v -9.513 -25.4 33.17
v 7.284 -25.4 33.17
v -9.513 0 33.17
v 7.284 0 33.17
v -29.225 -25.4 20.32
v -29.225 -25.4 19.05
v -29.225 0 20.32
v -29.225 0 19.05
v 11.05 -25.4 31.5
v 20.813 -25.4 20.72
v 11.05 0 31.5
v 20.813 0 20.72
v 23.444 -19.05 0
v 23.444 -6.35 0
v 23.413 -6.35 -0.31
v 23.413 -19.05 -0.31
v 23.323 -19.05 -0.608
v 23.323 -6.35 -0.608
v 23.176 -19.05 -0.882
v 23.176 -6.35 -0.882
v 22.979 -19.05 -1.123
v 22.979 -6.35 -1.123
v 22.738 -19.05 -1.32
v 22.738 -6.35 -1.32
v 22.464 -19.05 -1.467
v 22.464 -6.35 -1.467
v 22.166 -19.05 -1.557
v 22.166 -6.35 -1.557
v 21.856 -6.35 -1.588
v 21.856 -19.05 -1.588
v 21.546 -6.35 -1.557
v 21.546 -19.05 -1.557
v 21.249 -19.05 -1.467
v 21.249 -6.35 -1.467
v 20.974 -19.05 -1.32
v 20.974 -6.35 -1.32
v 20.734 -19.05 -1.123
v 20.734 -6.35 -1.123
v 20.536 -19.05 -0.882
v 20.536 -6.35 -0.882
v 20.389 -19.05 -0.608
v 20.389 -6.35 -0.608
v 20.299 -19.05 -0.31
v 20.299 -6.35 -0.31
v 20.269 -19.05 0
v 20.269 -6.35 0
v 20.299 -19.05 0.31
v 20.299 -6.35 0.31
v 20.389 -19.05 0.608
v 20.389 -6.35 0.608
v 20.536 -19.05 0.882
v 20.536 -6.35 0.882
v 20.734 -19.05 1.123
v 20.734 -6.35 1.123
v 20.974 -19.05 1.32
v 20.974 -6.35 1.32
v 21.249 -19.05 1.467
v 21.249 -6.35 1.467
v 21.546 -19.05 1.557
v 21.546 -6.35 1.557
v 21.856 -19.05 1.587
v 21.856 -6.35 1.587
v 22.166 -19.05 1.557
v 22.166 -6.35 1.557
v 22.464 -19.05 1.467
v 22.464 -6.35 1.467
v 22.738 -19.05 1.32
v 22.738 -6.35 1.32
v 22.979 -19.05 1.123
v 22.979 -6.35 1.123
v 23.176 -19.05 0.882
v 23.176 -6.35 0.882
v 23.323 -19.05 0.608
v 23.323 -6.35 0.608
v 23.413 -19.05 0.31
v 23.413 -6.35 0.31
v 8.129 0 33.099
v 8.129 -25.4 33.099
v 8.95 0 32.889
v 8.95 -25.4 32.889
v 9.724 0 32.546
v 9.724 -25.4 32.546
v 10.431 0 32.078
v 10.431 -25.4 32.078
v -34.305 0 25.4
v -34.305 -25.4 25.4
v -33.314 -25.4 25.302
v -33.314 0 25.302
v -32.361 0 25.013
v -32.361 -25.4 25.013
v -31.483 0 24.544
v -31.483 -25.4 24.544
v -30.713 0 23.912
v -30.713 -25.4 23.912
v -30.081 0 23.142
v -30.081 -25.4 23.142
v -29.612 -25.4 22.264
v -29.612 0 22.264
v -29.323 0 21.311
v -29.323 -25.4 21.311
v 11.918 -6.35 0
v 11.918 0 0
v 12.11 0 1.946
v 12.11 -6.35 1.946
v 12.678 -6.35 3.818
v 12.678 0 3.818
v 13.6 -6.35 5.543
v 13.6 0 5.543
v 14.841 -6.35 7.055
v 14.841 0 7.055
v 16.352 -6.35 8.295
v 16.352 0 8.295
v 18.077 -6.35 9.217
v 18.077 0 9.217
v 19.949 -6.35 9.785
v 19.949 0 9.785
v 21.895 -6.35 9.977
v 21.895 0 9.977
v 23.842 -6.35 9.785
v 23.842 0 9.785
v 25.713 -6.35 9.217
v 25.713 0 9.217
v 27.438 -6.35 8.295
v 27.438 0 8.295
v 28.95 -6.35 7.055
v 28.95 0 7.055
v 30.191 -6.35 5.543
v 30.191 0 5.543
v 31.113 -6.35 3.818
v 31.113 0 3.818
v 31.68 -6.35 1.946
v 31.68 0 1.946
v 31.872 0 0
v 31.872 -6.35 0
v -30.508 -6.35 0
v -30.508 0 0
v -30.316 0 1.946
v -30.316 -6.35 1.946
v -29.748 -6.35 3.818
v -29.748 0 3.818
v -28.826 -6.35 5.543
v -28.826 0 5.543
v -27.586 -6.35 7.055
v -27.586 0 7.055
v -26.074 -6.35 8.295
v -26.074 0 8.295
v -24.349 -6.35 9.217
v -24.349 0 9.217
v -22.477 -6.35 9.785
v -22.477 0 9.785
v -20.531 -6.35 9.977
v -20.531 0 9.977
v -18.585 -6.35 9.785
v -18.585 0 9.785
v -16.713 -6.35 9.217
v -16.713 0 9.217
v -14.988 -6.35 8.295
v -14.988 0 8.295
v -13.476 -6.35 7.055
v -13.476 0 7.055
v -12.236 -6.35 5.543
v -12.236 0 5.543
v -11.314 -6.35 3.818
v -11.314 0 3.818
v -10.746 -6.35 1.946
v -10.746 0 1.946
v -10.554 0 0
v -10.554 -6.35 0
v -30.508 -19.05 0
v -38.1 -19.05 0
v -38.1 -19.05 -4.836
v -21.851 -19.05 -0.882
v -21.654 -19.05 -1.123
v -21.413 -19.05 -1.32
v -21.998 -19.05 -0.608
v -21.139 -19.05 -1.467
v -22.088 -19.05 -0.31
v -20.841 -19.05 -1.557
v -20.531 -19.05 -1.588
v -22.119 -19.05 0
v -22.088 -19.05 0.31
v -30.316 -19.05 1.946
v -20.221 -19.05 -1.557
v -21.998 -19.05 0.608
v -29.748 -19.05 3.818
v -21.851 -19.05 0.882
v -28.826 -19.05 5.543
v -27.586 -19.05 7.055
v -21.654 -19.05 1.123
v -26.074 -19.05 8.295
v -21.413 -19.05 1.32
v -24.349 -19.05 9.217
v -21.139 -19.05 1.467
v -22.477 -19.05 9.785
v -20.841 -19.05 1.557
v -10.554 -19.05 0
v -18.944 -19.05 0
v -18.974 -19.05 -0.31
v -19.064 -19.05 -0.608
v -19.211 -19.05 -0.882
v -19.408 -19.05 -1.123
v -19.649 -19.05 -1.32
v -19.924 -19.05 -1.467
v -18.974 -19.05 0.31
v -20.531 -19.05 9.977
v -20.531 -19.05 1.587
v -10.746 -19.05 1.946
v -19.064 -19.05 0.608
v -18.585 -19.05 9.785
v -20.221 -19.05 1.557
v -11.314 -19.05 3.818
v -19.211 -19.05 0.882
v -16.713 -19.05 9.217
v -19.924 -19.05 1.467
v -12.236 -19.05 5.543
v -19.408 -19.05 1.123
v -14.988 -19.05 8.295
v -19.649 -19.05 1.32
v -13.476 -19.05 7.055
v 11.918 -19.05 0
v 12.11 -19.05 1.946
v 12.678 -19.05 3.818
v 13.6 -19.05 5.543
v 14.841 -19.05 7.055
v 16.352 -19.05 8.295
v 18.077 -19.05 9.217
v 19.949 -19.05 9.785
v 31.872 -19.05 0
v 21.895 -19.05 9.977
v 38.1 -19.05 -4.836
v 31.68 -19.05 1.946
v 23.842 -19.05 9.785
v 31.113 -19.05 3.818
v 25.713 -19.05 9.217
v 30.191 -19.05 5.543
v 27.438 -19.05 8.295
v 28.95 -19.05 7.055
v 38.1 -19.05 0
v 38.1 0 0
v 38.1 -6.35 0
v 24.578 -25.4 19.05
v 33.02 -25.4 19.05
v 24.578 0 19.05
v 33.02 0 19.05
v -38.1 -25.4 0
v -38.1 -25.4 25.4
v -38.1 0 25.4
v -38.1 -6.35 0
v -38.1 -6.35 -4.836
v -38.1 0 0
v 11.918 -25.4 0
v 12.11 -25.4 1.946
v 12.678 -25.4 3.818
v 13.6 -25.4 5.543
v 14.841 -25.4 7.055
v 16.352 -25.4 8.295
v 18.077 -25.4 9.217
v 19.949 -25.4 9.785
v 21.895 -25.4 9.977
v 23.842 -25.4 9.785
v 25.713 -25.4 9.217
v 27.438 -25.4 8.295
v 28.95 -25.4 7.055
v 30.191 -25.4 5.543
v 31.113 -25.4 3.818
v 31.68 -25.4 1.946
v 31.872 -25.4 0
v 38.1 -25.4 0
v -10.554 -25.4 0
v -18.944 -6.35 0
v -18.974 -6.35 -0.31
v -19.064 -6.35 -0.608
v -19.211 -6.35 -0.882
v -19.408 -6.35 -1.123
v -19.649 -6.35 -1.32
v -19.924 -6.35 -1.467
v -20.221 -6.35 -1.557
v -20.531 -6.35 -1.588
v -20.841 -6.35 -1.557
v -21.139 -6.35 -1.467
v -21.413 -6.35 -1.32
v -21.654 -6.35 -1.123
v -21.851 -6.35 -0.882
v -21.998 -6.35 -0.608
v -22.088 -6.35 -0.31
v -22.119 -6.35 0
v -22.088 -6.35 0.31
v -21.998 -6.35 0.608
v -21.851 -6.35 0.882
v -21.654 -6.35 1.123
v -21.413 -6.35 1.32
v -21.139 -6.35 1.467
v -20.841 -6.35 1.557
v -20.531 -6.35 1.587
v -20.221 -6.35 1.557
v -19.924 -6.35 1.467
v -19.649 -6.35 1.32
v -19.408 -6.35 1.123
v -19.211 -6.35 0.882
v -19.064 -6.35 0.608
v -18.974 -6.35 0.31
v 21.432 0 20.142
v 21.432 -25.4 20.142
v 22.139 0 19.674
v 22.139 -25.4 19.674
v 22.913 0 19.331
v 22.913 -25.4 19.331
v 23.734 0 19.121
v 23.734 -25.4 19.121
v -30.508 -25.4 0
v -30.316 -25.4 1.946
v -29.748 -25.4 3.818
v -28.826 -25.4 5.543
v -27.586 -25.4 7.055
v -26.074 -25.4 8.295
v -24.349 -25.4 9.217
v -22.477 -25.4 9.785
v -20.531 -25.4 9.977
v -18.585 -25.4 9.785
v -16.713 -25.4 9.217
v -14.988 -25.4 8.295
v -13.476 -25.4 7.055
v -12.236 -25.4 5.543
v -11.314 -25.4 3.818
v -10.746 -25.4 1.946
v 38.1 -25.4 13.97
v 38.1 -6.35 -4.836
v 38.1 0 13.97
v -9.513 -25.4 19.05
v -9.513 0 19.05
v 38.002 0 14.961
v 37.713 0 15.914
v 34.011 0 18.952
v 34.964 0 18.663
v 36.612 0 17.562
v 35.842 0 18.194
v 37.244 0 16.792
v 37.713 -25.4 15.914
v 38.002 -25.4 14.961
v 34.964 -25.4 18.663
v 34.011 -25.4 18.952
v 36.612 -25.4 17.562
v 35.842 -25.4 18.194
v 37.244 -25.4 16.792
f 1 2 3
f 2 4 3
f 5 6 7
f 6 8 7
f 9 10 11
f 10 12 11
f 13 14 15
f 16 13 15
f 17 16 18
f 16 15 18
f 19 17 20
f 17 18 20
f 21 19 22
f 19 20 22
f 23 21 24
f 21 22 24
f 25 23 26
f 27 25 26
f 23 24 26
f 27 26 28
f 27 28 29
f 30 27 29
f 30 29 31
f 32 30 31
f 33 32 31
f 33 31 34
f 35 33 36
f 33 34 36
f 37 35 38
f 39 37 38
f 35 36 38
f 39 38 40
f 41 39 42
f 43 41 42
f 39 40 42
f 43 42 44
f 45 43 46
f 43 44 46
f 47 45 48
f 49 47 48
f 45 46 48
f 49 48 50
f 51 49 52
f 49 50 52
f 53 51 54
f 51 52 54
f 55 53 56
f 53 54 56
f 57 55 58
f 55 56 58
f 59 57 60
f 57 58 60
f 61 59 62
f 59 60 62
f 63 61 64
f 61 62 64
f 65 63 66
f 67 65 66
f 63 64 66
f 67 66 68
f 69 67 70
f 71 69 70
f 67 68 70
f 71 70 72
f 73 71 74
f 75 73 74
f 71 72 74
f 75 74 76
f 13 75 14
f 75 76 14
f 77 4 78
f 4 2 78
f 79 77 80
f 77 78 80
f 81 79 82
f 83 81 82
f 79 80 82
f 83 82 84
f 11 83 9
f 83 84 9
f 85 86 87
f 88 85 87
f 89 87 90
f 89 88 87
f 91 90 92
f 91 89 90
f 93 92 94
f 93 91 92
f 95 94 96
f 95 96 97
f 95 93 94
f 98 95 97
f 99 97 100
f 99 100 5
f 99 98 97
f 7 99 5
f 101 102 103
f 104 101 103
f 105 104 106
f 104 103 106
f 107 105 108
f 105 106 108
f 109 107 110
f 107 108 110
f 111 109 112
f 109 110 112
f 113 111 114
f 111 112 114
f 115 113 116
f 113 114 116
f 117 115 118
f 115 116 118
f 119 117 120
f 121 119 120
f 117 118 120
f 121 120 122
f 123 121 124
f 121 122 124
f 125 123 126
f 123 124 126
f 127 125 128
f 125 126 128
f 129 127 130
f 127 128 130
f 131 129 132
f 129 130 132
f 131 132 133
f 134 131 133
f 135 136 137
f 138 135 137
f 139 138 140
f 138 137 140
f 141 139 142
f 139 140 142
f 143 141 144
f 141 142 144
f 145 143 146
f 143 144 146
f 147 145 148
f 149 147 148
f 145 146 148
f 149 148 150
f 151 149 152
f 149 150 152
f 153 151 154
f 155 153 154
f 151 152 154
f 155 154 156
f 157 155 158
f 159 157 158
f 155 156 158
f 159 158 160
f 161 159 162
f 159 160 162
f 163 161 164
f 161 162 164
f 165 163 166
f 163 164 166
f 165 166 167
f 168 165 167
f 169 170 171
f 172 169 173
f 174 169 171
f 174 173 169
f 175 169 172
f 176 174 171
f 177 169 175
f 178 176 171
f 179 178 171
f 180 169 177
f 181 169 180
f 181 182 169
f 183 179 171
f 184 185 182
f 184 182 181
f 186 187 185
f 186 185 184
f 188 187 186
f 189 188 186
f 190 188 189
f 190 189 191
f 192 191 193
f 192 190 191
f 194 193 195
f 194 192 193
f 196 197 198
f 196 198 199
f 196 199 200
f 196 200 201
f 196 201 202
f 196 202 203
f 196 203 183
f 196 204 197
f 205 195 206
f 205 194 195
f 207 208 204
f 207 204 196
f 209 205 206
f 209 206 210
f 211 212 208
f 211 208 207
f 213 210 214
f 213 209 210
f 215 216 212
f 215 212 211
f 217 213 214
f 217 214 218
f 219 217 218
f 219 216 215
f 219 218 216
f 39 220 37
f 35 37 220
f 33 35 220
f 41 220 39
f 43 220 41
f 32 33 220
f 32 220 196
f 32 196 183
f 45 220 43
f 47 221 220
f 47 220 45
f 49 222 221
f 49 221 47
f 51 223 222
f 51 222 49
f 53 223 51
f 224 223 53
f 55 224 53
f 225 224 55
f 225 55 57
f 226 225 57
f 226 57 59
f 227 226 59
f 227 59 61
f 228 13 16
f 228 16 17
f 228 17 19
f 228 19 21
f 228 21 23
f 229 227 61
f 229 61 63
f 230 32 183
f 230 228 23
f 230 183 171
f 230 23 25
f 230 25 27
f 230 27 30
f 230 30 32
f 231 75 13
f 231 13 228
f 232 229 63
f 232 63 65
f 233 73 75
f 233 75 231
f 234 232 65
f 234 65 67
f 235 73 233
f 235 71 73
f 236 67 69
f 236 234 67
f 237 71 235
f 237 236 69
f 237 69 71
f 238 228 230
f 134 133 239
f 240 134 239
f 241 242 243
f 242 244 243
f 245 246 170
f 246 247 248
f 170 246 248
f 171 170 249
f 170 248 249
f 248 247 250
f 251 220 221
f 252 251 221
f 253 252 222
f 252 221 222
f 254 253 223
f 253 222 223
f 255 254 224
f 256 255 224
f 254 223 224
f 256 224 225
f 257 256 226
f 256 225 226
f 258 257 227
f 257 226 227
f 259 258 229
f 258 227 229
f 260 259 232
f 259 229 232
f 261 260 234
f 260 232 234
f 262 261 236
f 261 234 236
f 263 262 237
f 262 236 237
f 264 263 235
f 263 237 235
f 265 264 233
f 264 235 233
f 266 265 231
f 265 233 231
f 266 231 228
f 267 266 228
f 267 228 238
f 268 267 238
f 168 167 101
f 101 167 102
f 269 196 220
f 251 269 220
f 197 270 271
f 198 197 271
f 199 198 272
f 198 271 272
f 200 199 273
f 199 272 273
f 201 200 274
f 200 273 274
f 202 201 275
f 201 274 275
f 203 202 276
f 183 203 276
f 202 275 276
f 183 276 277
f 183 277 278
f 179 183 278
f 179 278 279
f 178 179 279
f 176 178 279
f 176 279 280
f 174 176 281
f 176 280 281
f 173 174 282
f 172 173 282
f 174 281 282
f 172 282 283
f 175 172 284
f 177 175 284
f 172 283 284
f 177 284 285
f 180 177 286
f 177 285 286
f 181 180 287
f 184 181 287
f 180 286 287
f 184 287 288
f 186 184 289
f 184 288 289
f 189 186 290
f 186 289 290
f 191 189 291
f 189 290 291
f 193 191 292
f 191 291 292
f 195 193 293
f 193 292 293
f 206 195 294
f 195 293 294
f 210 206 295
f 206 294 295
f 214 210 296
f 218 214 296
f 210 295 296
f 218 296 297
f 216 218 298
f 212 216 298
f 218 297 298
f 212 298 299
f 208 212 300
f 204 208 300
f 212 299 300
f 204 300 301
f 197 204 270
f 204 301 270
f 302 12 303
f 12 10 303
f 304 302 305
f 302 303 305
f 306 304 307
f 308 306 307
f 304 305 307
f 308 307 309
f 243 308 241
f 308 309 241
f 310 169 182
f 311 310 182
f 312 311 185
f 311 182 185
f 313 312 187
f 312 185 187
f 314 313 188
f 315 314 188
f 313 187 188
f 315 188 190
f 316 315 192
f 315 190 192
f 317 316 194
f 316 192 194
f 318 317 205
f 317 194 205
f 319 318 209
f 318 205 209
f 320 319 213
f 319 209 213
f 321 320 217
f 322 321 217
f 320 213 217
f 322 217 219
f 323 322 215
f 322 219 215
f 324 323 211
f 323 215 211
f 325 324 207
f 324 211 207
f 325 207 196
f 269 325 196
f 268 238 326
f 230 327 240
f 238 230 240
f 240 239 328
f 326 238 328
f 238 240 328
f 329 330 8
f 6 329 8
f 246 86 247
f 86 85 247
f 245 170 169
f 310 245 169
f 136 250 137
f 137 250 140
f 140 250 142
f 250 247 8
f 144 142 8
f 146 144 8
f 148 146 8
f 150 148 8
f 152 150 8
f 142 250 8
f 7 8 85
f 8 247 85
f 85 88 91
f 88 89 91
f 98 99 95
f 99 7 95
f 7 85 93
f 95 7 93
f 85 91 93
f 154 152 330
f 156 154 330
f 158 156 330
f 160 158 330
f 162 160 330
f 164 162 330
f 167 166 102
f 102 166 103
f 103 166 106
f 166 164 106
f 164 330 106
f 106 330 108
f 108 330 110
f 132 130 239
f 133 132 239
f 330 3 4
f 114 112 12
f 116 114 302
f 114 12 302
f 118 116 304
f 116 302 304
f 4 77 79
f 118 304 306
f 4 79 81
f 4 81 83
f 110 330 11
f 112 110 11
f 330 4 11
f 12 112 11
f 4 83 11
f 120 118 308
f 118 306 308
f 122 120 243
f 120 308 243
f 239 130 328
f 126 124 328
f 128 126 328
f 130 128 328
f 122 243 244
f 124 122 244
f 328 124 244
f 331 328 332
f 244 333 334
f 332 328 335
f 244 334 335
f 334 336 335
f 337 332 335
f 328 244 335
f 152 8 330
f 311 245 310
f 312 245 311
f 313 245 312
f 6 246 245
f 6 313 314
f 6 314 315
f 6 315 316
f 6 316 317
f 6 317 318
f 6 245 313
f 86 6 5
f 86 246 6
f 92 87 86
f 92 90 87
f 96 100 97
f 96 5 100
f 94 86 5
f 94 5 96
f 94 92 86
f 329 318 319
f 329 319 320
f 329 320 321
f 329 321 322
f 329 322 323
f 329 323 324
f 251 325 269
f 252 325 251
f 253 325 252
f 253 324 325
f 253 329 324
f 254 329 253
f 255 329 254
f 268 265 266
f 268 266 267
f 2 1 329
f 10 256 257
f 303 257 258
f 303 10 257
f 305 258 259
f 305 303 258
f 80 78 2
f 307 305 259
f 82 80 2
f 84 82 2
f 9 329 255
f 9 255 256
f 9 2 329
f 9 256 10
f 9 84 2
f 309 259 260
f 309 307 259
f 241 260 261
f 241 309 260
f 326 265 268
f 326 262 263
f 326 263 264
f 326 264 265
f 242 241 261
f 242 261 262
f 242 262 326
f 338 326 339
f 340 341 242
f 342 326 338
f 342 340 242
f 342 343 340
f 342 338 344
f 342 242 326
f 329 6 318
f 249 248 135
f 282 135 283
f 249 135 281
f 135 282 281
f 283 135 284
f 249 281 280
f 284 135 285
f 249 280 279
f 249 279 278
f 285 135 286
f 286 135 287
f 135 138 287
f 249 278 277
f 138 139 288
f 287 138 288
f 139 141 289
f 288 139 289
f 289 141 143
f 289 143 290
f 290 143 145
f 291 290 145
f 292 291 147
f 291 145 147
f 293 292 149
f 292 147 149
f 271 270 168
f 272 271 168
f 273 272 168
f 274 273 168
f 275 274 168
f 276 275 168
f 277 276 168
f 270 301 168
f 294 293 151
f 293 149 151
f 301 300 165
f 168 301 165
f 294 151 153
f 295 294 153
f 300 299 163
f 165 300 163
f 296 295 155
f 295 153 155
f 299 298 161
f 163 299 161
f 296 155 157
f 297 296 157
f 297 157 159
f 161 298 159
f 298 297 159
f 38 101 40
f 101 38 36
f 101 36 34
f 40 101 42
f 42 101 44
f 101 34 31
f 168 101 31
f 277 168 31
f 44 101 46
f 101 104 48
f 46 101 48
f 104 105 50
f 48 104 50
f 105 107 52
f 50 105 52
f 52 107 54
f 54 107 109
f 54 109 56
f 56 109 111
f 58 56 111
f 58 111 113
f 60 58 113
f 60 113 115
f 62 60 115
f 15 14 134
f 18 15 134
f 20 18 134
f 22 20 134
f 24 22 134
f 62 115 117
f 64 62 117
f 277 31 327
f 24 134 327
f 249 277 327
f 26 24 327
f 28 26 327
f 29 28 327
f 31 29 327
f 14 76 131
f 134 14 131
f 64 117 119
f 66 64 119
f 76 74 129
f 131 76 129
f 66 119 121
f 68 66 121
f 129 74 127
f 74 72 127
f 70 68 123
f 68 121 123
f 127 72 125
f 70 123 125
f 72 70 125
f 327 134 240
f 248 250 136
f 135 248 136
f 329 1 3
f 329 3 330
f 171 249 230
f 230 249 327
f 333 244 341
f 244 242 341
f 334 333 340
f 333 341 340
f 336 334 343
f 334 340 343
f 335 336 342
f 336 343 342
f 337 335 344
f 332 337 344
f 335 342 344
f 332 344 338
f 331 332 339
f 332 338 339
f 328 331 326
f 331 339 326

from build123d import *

# Parameters (mm, degrees)
F1_DEPTH = 6.35
F3_DEPTH = 12.7
F5_DEPTH = 6.35
F6_R     = 5.08
F7_R     = 5.08
F8_R     = 5.08


with BuildPart() as f1:
    # F0 (on Front) → F1 (new body)
    with BuildSketch(Plane.XZ):
        with BuildLine():
            Line((-29.225341, 25.4), (-38.1, 25.4))
            Line((-38.1, 25.4), (-38.1, 0))
            Line((-38.1, 0), (-30.507866, 0))
            ThreePointArc((-30.507866, 0), (-20.531018, 9.976848), (-10.554171, 0))
            Line((-10.554171, 0), (11.91838, 0))
            ThreePointArc((11.91838, 0), (21.895228, 9.976848), (31.872075, 0))
            Line((31.872075, 0), (38.1, 0))
            Line((38.1, 0), (38.1, 19.05))
            Line((38.1, 19.05), (22.325266, 19.05))
            Line((22.325266, 19.05), (9.537391, 33.169942))
            Line((9.537391, 33.169942), (-9.512609, 33.169942))
            Line((-9.512609, 33.169942), (-9.512609, 19.05))
            Line((-9.512609, 19.05), (-29.225341, 19.05))
            Line((-29.225341, 19.05), (-29.225341, 25.4))
        make_face()
    extrude(amount=F1_DEPTH)

    # F2 (on face) → F3 (join)
    with BuildSketch(Plane.XZ.offset(6.35)):
        with BuildLine():
            Line((-29.225341, 25.4), (-38.1, 25.4))
            Line((-38.1, 25.4), (-38.1, 0))
            Line((-38.1, 0), (-22.118518, 0))
            ThreePointArc((-22.118518, 0), (-20.531018, 1.5875), (-18.943518, 0))
            Line((-18.943518, 0), (20.268538, 0))
            ThreePointArc((20.268538, 0), (21.856038, 1.5875), (23.443538, 0))
            Line((23.443538, 0), (38.1, 0))
            Line((38.1, 0), (38.1, 19.05))
            Line((38.1, 19.05), (22.325266, 19.05))
            Line((22.325266, 19.05), (9.537391, 33.169942))
            Line((9.537391, 33.169942), (-9.512609, 33.169942))
            Line((-9.512609, 33.169942), (-9.512609, 19.05))
            Line((-9.512609, 19.05), (-29.225341, 19.05))
            Line((-29.225341, 19.05), (-29.225341, 25.4))
        make_face()
        with BuildLine():
            Line((-22.118518, 0), (-38.1, 0))
            Line((-38.1, 0), (-38.1, -4.83568))
            Line((-38.1, -4.83568), (38.1, -4.83568))
            Line((38.1, -4.83568), (38.1, 0))
            Line((38.1, 0), (23.443538, 0))
            ThreePointArc((23.443538, 0), (21.856038, -1.5875), (20.268538, 0))
            Line((20.268538, 0), (-18.943518, 0))
            ThreePointArc((-18.943518, 0), (-20.531018, -1.5875), (-22.118518, 0))
        make_face()
    extrude(amount=F3_DEPTH)

    # F4 (on face) → F5 (join)
    with BuildSketch(Plane.XZ.offset(19.05)):
        with BuildLine():
            Line((-29.225341, 25.4), (-38.1, 25.4))
            Line((-38.1, 25.4), (-38.1, 0))
            Line((-38.1, 0), (-30.507866, 0))
            ThreePointArc((-30.507866, 0), (-20.531018, 9.976848), (-10.554171, 0))
            Line((-10.554171, 0), (11.91838, 0))
            ThreePointArc((11.91838, 0), (21.895228, 9.976848), (31.872075, 0))
            Line((31.872075, 0), (38.1, 0))
            Line((38.1, 0), (38.1, 19.05))
            Line((38.1, 19.05), (22.325266, 19.05))
            Line((22.325266, 19.05), (9.537391, 33.169942))
            Line((9.537391, 33.169942), (-9.512609, 33.169942))
            Line((-9.512609, 33.169942), (-9.512609, 19.05))
            Line((-9.512609, 19.05), (-29.225341, 19.05))
            Line((-29.225341, 19.05), (-29.225341, 25.4))
        make_face()
    extrude(amount=F5_DEPTH)

    # F6
    f6_edges = [f1.edges().sort_by_distance(p)[0] for p in [
        (-29.225341, -12.7, 25.4),
    ]]
    fillet(f6_edges, radius=F6_R)

    # F7
    f7_edges = [f1.edges().sort_by_distance(p)[0] for p in [
        (9.537391, -12.7, 33.169942),
    ]]
    fillet(f7_edges, radius=F7_R)

    # F8
    f8_edges = [f1.edges().sort_by_distance(p)[0] for p in [
        (22.325266, -12.7, 19.05),
        (38.1, -12.7, 19.05),
    ]]
    fillet(f8_edges, radius=F8_R)


solid = f1.part
